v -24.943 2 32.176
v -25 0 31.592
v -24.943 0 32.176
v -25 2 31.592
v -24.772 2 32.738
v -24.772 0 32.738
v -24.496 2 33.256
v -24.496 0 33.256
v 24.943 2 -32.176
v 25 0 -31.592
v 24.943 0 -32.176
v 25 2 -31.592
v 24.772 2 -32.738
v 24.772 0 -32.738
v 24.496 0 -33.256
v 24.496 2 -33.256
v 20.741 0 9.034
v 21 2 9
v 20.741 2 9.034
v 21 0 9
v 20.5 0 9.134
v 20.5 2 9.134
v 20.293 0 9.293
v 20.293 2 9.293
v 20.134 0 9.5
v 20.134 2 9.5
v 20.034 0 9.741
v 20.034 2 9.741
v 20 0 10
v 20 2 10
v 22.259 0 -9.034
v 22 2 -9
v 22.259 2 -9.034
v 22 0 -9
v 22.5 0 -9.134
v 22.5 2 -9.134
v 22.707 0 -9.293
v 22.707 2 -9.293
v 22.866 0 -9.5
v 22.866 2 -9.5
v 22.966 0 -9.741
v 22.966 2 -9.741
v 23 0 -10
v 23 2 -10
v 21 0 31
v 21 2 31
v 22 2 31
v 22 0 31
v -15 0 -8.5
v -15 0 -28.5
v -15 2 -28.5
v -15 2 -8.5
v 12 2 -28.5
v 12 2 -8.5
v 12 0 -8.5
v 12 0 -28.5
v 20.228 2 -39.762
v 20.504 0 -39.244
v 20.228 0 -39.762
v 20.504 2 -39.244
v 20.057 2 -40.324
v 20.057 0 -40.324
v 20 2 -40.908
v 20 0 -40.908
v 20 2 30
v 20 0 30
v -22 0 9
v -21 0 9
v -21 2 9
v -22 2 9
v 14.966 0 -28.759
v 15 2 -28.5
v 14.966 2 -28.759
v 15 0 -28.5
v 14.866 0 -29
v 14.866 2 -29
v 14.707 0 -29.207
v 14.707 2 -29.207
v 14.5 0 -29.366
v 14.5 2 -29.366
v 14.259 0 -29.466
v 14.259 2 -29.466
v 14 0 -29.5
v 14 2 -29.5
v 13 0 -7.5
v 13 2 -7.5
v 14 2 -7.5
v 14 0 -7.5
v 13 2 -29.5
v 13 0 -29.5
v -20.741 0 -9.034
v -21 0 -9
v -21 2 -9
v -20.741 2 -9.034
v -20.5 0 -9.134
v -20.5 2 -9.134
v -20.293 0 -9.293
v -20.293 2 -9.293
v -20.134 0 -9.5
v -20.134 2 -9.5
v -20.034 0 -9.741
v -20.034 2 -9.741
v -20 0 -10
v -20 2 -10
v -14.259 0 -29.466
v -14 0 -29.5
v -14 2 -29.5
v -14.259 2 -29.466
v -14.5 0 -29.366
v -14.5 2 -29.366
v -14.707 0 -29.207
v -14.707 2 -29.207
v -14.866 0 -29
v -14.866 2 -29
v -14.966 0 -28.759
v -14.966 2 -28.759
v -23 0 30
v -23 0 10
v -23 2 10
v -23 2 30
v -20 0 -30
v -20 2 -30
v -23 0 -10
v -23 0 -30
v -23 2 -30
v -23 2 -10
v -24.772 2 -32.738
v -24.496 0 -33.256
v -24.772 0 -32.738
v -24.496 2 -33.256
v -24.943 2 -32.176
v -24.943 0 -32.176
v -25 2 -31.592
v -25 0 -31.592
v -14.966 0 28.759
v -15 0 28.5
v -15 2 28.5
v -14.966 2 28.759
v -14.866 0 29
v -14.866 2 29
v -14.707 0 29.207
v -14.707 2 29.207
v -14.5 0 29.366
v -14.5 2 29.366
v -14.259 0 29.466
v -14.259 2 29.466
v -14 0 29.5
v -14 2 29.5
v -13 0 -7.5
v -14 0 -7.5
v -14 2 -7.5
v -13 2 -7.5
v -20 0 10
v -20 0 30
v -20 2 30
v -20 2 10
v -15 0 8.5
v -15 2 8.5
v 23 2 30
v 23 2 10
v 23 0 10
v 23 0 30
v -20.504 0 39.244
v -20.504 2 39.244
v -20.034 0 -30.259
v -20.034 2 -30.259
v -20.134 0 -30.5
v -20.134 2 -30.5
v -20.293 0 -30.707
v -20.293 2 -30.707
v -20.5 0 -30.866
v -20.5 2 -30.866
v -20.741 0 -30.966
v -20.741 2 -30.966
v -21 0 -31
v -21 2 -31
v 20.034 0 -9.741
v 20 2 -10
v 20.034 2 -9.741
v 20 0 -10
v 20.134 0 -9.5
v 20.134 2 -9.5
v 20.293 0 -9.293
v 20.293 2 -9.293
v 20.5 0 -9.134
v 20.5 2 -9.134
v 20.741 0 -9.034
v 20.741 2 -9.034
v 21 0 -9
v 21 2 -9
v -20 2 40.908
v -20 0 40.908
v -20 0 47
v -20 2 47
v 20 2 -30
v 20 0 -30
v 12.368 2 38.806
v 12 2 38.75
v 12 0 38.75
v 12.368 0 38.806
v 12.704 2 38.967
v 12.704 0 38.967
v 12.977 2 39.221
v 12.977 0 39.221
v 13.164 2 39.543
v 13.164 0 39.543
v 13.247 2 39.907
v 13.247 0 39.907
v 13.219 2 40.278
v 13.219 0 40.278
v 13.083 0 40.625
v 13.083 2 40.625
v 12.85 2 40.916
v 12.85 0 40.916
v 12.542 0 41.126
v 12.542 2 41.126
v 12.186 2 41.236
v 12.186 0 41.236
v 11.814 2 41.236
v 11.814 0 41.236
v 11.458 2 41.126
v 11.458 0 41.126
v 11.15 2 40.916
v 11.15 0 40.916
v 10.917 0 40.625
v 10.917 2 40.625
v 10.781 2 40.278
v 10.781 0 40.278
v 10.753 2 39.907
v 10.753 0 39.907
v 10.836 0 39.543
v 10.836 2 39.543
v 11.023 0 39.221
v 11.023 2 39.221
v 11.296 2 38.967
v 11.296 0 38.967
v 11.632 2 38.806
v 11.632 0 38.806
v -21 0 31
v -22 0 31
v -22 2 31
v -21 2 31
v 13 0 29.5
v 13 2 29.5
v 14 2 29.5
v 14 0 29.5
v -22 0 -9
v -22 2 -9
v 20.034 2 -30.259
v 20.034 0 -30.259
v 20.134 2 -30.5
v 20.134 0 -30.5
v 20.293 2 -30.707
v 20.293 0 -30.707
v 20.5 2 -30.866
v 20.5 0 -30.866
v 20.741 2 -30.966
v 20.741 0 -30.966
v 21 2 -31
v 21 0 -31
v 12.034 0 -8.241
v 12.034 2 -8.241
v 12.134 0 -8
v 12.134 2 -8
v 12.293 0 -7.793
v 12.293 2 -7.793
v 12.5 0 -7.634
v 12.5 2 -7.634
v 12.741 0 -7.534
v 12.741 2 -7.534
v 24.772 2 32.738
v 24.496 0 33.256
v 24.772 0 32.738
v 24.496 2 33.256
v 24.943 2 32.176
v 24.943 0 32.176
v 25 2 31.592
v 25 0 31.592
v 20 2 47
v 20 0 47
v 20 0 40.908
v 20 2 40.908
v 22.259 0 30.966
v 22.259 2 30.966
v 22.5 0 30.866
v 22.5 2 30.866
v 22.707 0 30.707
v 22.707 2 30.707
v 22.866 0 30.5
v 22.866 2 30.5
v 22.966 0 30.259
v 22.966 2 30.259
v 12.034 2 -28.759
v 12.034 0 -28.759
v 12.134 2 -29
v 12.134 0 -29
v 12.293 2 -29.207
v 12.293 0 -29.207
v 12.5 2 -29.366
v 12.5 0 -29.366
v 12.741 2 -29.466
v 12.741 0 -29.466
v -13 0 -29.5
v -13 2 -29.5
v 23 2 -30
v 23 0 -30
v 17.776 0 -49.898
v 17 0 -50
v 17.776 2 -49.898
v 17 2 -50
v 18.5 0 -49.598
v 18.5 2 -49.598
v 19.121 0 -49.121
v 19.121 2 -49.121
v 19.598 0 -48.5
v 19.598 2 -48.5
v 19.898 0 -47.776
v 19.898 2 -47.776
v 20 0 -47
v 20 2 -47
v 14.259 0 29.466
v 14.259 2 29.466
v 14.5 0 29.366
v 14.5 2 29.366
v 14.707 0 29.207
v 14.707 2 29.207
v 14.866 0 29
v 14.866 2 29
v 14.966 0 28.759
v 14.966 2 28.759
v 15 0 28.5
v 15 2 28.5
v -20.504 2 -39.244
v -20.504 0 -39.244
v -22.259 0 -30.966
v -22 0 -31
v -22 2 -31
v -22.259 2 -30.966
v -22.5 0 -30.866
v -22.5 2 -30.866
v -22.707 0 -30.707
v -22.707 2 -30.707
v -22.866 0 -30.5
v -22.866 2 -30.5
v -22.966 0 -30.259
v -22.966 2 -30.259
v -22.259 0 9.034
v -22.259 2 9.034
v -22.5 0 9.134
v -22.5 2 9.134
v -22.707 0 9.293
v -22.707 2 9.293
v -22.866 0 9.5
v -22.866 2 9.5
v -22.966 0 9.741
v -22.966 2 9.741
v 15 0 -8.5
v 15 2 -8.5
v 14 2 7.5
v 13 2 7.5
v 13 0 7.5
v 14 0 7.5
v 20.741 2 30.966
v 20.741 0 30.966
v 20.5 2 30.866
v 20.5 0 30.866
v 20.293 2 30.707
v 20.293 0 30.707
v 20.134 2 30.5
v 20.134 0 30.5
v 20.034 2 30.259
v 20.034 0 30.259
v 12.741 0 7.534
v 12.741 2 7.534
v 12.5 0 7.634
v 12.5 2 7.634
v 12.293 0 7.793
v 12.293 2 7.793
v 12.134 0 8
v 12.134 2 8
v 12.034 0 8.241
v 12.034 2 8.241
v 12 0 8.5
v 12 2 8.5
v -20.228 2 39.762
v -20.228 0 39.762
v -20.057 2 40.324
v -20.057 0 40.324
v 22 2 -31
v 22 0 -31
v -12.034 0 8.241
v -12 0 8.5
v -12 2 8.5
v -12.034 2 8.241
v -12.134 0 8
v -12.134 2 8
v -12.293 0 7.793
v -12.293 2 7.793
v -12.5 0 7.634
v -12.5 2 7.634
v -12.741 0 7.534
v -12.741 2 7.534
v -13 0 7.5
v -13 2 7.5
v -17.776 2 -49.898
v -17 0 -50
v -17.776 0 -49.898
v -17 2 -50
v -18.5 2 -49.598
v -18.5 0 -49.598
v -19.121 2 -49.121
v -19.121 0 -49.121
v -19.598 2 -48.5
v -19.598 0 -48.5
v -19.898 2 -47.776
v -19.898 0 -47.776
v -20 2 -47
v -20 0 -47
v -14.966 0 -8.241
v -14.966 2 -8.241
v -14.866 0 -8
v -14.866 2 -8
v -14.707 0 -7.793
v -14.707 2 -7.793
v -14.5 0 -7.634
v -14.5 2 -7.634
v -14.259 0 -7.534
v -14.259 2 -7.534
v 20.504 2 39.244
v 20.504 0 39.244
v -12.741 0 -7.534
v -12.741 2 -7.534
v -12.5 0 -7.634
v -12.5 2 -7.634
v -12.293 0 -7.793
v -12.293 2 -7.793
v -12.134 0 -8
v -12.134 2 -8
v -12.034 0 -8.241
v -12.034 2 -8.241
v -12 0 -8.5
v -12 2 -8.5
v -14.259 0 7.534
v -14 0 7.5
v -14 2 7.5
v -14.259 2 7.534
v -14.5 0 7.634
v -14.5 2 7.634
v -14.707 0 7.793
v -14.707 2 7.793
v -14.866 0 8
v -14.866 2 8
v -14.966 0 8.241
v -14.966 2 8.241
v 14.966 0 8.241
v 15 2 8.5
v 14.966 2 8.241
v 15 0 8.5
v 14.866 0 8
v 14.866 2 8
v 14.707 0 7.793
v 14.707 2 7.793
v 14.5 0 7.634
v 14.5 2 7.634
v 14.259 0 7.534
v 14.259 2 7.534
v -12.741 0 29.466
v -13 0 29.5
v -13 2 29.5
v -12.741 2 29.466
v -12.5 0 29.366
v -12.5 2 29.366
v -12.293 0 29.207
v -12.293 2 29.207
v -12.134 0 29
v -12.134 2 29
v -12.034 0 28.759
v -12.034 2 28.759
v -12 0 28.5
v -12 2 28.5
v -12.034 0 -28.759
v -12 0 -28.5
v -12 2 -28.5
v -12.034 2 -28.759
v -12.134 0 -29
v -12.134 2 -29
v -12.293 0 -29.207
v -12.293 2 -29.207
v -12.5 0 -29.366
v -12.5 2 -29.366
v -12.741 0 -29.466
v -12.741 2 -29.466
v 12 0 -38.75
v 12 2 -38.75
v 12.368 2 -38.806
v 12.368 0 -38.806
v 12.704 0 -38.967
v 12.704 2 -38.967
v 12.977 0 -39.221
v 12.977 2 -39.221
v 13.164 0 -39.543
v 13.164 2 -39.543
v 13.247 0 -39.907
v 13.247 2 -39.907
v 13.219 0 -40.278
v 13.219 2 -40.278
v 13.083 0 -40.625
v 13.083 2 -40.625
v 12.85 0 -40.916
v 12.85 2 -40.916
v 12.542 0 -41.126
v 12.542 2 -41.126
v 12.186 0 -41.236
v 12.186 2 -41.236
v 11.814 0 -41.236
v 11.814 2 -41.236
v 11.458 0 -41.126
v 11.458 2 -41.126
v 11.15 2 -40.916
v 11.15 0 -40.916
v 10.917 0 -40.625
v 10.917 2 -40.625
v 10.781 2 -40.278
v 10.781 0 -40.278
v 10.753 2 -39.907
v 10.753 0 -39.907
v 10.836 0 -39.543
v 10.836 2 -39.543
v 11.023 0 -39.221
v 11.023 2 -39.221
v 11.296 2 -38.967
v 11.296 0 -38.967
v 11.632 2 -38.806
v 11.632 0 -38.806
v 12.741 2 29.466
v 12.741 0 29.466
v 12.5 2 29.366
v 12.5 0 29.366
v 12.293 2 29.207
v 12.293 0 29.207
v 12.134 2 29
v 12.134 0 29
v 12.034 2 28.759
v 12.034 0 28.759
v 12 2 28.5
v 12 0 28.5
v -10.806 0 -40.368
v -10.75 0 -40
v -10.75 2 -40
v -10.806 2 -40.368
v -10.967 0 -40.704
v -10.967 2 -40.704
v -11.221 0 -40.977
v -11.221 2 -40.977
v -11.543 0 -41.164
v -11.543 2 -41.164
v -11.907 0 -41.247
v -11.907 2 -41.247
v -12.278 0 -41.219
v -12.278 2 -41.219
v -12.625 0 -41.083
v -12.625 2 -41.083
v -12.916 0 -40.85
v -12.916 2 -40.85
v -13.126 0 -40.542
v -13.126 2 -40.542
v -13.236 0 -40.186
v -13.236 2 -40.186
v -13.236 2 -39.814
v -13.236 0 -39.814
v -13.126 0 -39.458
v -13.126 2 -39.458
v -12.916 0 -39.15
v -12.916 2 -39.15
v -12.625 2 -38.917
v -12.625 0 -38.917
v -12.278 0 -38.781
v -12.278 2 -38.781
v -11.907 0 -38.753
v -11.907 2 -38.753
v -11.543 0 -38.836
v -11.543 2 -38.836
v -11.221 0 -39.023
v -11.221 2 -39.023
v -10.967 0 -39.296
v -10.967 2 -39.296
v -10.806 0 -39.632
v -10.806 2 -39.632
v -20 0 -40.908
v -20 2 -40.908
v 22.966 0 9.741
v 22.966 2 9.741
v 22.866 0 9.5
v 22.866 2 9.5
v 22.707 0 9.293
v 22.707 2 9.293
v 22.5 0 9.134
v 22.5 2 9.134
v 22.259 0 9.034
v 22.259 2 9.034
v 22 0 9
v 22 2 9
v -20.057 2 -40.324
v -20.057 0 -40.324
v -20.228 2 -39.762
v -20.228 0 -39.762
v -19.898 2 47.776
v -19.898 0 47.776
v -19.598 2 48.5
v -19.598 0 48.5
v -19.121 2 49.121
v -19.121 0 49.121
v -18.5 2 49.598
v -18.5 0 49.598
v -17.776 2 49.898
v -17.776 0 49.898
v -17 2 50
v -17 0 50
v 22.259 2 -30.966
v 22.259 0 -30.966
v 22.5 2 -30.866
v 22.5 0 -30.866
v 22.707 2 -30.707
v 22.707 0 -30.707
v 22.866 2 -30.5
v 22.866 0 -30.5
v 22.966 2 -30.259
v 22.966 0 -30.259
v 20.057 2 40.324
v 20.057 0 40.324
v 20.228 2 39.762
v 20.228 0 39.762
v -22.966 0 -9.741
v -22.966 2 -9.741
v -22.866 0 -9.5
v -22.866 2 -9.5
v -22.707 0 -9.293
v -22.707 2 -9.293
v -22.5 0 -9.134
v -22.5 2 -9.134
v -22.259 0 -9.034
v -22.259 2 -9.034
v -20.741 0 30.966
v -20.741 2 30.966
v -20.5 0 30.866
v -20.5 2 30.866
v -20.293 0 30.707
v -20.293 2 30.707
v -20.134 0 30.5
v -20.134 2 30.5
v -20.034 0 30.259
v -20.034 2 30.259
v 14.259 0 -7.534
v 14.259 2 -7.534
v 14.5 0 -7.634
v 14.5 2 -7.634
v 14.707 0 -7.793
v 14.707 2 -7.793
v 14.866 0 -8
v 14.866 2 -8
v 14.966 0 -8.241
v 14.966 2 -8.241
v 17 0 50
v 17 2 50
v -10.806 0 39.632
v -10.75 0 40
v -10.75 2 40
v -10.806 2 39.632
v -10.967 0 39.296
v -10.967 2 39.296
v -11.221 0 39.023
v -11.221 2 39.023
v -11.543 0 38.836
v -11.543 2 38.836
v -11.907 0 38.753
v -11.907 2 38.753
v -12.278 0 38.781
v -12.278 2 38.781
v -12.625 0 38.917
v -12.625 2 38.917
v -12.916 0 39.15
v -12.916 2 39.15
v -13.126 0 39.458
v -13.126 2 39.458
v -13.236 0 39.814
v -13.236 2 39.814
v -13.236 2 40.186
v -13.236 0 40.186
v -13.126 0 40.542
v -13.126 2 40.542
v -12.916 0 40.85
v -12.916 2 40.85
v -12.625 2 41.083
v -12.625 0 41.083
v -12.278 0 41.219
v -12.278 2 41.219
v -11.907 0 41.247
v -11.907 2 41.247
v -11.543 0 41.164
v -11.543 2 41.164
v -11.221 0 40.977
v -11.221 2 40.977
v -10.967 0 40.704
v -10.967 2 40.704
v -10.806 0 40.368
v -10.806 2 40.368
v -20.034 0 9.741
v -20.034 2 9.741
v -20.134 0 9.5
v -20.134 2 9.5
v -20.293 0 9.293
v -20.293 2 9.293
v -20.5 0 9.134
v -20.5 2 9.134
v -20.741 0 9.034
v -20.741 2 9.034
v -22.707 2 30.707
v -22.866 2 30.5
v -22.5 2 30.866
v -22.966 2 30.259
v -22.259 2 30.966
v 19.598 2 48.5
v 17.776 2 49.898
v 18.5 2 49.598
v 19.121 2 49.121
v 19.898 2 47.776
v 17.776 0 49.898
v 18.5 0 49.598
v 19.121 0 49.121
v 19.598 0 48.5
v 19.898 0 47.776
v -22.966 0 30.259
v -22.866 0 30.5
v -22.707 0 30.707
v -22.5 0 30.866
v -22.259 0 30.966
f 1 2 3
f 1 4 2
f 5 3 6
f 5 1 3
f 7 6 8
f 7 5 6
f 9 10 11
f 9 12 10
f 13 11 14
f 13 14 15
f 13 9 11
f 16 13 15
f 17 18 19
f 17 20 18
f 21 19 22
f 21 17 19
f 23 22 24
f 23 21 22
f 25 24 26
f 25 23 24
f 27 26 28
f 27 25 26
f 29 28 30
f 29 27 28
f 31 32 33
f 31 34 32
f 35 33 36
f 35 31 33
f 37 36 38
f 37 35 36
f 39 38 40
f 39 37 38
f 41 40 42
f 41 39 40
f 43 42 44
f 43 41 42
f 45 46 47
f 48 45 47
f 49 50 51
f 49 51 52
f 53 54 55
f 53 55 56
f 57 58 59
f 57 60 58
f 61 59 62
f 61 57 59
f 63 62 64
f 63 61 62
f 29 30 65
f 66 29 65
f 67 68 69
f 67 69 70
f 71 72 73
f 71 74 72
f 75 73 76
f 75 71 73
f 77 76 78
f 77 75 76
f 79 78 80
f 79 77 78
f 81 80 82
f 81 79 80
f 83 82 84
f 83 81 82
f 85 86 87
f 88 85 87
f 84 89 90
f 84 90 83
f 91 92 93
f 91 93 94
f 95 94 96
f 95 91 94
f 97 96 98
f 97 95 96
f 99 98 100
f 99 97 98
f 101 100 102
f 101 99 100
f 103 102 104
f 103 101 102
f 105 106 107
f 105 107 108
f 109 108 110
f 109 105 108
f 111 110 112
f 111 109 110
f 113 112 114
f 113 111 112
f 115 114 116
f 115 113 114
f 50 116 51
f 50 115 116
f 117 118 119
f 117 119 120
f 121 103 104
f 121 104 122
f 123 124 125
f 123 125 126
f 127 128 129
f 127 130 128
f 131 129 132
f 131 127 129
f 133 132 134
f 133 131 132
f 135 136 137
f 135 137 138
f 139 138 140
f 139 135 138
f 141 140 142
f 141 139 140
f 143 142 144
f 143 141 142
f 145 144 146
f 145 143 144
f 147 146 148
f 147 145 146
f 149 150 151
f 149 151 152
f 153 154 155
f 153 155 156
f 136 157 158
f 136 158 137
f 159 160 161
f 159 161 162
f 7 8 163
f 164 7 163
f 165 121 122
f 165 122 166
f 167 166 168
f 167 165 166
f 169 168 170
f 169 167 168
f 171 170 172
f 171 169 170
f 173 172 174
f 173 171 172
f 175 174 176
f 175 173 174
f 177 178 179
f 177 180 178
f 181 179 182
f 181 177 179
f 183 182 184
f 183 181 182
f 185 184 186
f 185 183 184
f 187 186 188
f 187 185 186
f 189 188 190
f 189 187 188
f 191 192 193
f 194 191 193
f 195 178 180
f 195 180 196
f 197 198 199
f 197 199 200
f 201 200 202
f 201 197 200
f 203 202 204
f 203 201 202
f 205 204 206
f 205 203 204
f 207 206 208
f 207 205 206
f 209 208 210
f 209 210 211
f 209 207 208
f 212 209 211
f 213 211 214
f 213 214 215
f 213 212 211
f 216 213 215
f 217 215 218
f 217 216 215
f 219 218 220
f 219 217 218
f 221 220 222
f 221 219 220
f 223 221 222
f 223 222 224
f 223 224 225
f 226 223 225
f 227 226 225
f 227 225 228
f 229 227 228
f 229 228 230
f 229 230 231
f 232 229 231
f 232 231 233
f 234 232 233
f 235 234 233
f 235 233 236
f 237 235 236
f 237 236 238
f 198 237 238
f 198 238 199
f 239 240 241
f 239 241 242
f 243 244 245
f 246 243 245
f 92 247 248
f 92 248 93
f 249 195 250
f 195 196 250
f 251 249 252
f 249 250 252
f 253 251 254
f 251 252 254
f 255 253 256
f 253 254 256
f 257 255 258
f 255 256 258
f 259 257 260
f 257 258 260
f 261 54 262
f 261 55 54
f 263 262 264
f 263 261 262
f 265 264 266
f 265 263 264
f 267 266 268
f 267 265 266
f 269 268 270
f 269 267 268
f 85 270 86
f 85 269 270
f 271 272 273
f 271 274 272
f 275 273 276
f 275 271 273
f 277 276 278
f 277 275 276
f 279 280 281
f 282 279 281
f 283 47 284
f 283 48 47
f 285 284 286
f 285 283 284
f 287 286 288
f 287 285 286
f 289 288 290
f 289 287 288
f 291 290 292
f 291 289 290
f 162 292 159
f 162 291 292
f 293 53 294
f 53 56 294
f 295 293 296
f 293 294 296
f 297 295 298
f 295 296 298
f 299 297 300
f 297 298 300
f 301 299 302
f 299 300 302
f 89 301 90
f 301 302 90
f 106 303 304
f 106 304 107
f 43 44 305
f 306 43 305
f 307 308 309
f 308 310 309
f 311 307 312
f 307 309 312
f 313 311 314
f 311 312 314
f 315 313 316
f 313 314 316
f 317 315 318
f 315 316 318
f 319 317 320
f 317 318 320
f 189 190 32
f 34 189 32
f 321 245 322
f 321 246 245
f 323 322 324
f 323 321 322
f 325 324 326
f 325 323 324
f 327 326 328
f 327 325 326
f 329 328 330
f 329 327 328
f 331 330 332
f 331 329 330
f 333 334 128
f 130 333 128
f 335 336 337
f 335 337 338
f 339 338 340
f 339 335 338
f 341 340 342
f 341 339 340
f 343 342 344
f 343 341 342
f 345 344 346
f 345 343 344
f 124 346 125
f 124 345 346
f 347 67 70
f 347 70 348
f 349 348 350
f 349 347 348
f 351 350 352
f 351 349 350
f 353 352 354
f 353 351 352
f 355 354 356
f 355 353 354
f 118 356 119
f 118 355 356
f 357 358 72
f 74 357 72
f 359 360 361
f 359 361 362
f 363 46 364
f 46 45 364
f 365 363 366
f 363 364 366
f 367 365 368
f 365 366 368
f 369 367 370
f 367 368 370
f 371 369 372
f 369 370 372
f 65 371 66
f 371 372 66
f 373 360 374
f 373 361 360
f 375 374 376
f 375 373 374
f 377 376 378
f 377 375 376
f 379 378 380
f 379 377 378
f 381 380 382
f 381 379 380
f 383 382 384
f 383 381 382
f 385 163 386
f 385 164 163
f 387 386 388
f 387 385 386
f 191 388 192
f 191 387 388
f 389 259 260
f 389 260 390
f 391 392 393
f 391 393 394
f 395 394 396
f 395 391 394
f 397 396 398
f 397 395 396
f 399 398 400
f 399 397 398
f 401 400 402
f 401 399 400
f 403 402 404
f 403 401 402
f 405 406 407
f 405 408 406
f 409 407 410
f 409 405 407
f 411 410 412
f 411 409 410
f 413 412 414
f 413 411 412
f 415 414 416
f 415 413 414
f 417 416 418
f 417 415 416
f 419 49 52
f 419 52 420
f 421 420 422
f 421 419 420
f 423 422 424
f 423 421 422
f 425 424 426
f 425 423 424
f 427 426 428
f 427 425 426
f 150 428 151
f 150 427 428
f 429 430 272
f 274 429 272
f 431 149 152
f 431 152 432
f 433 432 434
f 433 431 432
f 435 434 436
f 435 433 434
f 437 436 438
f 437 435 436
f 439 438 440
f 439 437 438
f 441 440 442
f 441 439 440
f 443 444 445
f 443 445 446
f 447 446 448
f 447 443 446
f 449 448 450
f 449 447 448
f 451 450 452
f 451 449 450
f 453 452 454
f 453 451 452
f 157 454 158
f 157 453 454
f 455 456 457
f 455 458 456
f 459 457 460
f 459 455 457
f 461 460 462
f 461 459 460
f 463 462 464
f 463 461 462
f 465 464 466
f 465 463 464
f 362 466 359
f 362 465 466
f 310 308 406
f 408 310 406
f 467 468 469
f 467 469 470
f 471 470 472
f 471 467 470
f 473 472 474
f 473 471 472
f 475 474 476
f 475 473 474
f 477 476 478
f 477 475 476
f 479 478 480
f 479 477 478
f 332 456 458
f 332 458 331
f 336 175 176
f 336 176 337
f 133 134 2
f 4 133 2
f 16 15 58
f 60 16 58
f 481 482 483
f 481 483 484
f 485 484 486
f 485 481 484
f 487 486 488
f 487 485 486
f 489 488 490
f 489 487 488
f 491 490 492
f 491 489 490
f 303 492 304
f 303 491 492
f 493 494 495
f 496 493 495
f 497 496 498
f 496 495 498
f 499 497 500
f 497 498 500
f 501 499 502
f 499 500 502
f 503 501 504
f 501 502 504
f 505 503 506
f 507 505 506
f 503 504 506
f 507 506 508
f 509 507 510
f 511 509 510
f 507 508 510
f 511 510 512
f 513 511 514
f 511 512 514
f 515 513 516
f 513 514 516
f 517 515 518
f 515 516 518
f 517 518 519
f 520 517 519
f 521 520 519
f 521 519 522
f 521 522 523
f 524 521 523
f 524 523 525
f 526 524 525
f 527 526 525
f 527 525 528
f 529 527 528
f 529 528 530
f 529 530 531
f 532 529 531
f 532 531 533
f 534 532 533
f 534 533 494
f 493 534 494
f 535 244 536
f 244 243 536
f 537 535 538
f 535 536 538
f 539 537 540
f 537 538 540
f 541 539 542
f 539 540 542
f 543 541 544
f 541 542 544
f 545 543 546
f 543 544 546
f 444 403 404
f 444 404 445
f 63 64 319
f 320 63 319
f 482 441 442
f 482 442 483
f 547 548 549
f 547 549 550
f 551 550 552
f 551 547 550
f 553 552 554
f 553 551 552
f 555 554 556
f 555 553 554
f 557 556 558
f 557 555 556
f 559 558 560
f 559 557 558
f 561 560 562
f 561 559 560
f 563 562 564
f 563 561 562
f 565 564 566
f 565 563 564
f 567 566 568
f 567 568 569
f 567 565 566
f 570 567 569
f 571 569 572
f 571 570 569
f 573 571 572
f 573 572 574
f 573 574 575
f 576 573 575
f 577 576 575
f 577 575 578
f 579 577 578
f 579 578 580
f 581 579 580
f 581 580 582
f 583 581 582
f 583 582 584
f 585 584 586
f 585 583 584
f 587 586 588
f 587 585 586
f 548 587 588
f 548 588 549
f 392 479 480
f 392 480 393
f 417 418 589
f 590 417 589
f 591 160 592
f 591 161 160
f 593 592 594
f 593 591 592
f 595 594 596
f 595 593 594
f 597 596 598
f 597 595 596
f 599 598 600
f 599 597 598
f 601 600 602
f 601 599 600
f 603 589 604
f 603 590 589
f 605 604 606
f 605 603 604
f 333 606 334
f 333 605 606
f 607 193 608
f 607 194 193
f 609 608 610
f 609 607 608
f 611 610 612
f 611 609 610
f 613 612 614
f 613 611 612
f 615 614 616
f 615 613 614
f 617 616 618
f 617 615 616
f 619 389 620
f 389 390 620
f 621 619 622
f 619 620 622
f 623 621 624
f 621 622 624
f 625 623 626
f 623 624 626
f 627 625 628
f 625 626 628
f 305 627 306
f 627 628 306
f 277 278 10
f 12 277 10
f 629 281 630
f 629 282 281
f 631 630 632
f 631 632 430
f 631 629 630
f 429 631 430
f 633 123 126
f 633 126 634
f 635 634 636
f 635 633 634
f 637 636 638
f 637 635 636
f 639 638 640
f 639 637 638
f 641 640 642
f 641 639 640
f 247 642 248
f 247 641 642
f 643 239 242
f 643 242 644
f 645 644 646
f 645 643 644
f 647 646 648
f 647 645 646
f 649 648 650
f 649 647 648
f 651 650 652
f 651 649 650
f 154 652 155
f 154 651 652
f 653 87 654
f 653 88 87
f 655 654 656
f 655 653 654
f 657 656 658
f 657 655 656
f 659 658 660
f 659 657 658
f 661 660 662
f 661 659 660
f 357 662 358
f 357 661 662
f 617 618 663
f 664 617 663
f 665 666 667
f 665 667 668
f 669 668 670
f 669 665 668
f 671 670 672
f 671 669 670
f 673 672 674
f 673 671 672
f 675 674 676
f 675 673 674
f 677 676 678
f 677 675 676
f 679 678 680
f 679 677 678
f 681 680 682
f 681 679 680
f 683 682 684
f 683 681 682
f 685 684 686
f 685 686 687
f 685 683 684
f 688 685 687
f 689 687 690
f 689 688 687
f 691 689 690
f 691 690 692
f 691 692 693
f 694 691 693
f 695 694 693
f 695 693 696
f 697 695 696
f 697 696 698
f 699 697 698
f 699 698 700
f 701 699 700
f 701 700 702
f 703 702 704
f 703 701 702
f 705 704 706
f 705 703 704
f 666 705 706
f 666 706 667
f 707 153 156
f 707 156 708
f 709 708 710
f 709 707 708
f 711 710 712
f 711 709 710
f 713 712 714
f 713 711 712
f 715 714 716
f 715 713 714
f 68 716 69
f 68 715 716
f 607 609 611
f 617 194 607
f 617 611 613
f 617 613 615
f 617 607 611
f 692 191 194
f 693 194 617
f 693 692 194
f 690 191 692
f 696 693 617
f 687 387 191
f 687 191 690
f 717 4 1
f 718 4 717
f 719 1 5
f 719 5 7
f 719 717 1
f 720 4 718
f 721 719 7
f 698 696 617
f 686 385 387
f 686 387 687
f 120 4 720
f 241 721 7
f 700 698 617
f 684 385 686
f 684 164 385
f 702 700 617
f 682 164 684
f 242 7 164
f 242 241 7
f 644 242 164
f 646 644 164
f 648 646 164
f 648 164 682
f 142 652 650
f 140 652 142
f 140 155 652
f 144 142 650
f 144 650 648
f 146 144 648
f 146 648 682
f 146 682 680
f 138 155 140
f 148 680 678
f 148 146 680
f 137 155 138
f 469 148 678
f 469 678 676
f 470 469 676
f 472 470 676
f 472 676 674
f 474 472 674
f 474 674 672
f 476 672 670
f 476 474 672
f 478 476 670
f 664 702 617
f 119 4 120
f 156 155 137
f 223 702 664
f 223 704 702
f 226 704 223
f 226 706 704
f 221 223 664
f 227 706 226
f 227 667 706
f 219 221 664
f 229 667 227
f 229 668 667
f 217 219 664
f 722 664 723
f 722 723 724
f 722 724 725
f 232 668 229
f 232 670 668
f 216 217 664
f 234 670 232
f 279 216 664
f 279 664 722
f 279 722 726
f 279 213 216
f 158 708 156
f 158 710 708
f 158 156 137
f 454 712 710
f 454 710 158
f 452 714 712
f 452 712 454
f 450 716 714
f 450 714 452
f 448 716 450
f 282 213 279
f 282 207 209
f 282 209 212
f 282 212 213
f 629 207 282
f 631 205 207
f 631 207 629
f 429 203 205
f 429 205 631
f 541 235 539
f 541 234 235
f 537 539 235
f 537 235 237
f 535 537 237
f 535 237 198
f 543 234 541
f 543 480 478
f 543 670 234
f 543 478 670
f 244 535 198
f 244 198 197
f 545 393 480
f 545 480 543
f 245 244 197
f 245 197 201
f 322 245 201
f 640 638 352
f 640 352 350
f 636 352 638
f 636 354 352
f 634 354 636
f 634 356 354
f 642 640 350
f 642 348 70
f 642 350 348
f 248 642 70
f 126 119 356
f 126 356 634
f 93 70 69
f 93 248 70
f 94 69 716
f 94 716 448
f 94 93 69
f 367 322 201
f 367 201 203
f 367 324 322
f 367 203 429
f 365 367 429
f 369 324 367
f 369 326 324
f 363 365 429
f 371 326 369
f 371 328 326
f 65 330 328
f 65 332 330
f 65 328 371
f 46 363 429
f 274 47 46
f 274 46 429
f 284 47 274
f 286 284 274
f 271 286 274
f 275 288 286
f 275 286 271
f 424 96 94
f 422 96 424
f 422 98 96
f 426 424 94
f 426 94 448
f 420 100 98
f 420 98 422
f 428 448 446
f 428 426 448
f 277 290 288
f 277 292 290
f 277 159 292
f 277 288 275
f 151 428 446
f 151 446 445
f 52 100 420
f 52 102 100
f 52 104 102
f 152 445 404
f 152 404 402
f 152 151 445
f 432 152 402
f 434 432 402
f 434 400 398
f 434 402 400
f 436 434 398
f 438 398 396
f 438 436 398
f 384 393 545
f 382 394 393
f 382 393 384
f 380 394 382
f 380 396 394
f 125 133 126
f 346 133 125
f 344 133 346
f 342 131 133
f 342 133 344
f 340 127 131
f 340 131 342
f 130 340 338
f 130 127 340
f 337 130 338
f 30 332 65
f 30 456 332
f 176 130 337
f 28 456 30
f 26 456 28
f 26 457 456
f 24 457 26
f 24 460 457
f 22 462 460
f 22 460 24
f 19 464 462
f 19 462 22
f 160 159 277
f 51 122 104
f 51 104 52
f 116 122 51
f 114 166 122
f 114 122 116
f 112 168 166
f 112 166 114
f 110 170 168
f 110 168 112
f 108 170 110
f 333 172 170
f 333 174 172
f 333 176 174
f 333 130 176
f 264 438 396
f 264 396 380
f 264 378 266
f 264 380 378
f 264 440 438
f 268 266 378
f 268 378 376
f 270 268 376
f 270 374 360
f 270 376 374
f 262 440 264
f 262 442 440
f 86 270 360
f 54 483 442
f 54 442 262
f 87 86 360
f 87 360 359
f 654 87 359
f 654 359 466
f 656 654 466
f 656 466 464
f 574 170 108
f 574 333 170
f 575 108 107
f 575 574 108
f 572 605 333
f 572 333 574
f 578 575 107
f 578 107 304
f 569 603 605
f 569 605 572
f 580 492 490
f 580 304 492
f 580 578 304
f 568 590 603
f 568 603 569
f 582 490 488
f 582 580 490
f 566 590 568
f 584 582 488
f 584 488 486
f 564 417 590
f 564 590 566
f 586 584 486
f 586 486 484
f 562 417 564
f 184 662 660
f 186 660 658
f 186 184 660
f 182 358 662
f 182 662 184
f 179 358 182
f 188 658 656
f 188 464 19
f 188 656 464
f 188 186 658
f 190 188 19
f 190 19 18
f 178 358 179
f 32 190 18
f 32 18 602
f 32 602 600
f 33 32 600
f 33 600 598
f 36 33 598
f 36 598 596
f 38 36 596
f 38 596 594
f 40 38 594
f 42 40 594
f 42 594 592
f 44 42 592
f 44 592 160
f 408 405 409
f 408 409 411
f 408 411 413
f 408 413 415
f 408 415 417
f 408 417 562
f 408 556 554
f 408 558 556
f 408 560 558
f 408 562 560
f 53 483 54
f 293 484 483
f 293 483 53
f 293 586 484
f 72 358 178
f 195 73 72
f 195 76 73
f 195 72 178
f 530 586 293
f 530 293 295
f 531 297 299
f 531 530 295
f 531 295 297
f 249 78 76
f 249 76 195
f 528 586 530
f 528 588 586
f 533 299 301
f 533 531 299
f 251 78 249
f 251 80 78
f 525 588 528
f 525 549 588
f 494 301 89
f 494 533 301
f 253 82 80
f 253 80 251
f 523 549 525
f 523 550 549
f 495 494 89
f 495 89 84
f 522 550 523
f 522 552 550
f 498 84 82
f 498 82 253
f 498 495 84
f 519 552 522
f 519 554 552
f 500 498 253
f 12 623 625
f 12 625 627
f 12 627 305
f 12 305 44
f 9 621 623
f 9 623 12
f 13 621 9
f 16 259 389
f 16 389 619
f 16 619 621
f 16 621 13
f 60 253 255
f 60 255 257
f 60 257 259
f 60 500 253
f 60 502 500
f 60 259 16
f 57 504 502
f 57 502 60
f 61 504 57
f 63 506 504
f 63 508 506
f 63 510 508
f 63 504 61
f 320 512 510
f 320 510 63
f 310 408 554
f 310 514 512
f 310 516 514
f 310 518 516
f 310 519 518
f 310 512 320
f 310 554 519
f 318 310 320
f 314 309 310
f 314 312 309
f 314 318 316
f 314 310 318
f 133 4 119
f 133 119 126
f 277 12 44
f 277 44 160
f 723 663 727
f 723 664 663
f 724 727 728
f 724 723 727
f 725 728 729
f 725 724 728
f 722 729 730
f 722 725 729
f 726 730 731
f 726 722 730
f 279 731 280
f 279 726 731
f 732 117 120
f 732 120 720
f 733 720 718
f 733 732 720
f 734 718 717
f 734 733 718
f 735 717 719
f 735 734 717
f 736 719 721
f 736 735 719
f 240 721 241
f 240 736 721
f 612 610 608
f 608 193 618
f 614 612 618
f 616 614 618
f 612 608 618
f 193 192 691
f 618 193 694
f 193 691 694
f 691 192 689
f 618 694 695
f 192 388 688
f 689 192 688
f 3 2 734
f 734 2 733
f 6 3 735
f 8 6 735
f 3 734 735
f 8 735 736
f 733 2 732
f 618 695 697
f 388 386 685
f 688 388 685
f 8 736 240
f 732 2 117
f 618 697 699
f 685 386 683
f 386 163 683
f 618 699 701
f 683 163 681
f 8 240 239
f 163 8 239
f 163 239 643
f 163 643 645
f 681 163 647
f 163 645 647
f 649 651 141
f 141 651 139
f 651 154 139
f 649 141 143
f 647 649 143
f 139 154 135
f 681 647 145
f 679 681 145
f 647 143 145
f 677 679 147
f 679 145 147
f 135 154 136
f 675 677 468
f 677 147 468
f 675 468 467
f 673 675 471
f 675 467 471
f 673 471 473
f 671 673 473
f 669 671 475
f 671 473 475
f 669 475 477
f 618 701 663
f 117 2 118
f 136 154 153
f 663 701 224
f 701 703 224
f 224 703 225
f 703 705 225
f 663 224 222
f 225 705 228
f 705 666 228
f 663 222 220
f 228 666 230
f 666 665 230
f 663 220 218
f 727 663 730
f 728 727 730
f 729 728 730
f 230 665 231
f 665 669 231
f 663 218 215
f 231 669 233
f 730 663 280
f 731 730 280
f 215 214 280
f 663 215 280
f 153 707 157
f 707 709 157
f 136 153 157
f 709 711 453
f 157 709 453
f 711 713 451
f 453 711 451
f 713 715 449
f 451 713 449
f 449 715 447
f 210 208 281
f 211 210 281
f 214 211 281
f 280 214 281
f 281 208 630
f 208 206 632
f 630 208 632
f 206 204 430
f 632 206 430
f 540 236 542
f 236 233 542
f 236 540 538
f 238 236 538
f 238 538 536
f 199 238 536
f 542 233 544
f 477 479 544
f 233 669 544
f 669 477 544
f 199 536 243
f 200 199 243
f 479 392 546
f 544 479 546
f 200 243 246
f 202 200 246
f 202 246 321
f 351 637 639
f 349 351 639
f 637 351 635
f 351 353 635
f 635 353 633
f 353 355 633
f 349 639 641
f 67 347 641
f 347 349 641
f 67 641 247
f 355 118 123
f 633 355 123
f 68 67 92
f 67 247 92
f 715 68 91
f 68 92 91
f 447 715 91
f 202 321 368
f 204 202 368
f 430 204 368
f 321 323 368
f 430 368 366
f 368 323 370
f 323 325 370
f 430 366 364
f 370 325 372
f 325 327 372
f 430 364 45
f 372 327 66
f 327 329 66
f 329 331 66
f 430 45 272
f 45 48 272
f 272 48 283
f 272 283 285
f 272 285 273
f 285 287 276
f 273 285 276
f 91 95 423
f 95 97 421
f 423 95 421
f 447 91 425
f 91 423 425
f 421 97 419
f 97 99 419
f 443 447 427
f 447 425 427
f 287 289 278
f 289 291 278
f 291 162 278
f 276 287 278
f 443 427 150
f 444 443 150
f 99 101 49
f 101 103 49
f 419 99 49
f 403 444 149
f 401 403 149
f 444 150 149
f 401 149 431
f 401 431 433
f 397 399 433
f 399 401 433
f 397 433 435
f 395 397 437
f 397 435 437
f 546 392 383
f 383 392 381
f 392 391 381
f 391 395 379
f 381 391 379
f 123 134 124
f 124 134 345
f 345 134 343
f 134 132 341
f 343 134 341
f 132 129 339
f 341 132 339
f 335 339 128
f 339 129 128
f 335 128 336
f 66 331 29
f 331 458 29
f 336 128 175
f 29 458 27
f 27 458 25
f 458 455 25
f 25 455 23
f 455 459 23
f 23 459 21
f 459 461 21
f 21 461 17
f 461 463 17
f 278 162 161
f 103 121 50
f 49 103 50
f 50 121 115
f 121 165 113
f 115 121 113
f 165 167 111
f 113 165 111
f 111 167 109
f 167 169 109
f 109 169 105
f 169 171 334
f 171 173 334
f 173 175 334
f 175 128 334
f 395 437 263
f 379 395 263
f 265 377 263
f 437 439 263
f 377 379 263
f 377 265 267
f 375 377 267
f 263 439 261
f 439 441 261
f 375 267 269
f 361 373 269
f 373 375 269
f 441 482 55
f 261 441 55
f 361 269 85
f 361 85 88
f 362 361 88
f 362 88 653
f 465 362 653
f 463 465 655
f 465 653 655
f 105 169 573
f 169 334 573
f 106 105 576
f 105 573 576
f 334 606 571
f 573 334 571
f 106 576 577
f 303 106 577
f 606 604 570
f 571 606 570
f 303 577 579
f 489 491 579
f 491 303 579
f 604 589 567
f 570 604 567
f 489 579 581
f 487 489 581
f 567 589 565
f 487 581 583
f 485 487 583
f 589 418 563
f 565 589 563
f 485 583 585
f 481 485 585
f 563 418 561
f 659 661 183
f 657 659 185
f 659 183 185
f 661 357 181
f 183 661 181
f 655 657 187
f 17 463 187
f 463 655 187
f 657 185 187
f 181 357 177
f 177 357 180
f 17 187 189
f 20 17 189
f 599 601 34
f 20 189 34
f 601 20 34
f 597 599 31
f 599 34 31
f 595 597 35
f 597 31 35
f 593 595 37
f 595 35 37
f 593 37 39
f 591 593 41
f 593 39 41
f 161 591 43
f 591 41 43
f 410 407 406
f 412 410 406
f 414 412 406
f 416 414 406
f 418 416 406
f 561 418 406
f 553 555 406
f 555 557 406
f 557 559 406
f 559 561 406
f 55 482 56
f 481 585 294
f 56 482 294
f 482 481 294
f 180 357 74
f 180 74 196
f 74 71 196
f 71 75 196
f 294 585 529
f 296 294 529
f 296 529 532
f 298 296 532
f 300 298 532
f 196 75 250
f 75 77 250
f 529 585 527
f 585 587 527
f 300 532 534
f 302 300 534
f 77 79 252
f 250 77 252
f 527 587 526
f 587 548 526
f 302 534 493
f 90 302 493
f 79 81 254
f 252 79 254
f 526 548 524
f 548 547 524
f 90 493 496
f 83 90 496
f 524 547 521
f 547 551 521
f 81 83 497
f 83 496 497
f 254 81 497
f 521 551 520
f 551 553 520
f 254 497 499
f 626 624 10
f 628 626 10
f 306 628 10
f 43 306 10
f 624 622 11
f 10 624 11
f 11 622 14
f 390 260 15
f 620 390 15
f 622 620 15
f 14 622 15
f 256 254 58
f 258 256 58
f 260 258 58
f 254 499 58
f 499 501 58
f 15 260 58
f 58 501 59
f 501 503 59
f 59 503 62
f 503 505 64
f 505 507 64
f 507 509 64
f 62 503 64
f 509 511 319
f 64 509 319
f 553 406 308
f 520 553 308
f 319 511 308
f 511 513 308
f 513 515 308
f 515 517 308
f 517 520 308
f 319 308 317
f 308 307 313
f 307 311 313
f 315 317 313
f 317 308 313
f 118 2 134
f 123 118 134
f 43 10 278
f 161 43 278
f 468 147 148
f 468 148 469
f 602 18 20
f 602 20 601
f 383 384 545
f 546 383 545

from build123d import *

# Parameters (mm, degrees)
BOSS_EXTRUDE1_DEPTH  = 2
FILLET1_R            = 3
CUT_EXTRUDE1_REACH   = 57.937
SKETCH2_R            = 1.25
SKETCH2_W            = 3
SKETCH2_H            = 22
FILLET2_R            = 1
FILLET2_OF_MIRROR1_R = 1
MIRROR2_OUTLINE_R    = 1.25
MIRROR2_DEPTH        = 2


# Read off the part's stored shape, not the designer's step: Mirror2
with BuildPart() as part:
    # Sketch1 → Boss-Extrude1 (new body)
    with BuildSketch(Plane(origin=(0, 0, 0), x_dir=(1, 0, 0), z_dir=(0, 1, 0))):
        Polygon((20, 50), (-20, 50), (-20, 40), (-25, 32.5), (-25, -32.5), (-20, -40), (-20, -50), (20, -50), (20, -40), (25, -32.5), (25, 32.5), (20, 40), align=None)
    extrude(amount=BOSS_EXTRUDE1_DEPTH)

    # Fillet1
    fillet1_edges = [part.edges().sort_by_distance(p)[0] for p in [
        (-20, 1, -50),
        (20, 1, -50),
        (20, 1, -40),
        (25, 1, -32.5),
        (25, 1, 32.5),
        (20, 1, 40),
        (20, 1, 50),
        (-20, 1, 50),
        (-20, 1, 40),
        (-25, 1, 32.5),
        (-25, 1, -32.5),
        (-20, 1, -40),
    ]]
    fillet(fillet1_edges, radius=FILLET1_R)

    # Sketch2 → Cut-Extrude1 (cut, up to next)
    with BuildSketch(Plane(origin=(0, 2, 0), x_dir=(1, 0, 0), z_dir=(0, 1, 0)), mode=Mode.PRIVATE) as cut_extrude1_sk1:
        with Locations(Location((12, 40, 0), (0, 0, 270))):
            Circle(SKETCH2_R)
    cut_extrude1_tool1 = extrude(cut_extrude1_sk1.sketch, amount=-CUT_EXTRUDE1_REACH, mode=Mode.PRIVATE) & part.part
    # Sketch2 → Cut-Extrude1 (cut, up to next)
    with BuildSketch(Plane(origin=(0, 2, 0), x_dir=(1, 0, 0), z_dir=(0, 1, 0)), mode=Mode.PRIVATE) as cut_extrude1_sk2:
        with Locations((21.5, 20)):
            Rectangle(SKETCH2_W, SKETCH2_H)
    cut_extrude1_tool2 = extrude(cut_extrude1_sk2.sketch, amount=-CUT_EXTRUDE1_REACH, mode=Mode.PRIVATE) & part.part
    # Sketch2 → Cut-Extrude1 (cut, up to next)
    with BuildSketch(Plane(origin=(0, 2, 0), x_dir=(1, 0, 0), z_dir=(0, 1, 0)), mode=Mode.PRIVATE) as cut_extrude1_sk3:
        with Locations((13.5, 18.5)):
            Rectangle(SKETCH2_W, SKETCH2_H)
    cut_extrude1_tool3 = extrude(cut_extrude1_sk3.sketch, amount=-CUT_EXTRUDE1_REACH, mode=Mode.PRIVATE) & part.part
    cut_extrude1_1 = cut_extrude1_tool1.solids().sort_by_distance((12, 2, -40))[0]
    add(cut_extrude1_1, mode=Mode.SUBTRACT)
    cut_extrude1_2 = cut_extrude1_tool2.solids().sort_by_distance((21.5, 2, -20))[0]
    add(cut_extrude1_2, mode=Mode.SUBTRACT)
    cut_extrude1_3 = cut_extrude1_tool3.solids().sort_by_distance((13.5, 2, -18.5))[0]
    add(cut_extrude1_3, mode=Mode.SUBTRACT)
    cut_extrude1 = cut_extrude1_1 + cut_extrude1_2 + cut_extrude1_3  # Cut-Extrude1 as one shape, for the pattern or mirror that repeats it

    # Fillet2
    fillet2_edges = [part.edges().sort_by_distance(p)[0] for p in [
        (20, 1, -9),
        (20, 1, -31),
        (23, 1, -31),
        (23, 1, -9),
        (15, 1, -29.5),
        (15, 1, -7.5),
        (12, 1, -7.5),
        (12, 1, -29.5),
    ]]
    fillet(fillet2_edges, radius=FILLET2_R)

    # Mirror1: Cut-Extrude1 across plane
    add(cut_extrude1.mirror(Plane.XY), mode=Mode.SUBTRACT)

    # Fillet2 of Mirror1
    fillet2_of_mirror1_edges = [part.edges().sort_by_distance(p)[0] for p in [
        (20, 1, 9),
        (20, 1, 31),
        (23, 1, 31),
        (23, 1, 9),
        (15, 1, 29.5),
        (15, 1, 7.5),
        (12, 1, 7.5),
        (12, 1, 29.5),
    ]]
    fillet(fillet2_of_mirror1_edges, radius=FILLET2_OF_MIRROR1_R)

    # Mirror2 outline → Mirror2 (cut)
    with BuildSketch(Plane(origin=(0, 0, 0), x_dir=(1, 0, 0), z_dir=(0, 1, 0))):
        with BuildLine():
            Line((-20, 10), (-20, 30))
            ThreePointArc((-20, 30), (-20.292893219, 30.707106781), (-21, 31))
            Line((-21, 31), (-22, 31))
            ThreePointArc((-22, 31), (-22.707106781, 30.707106781), (-23, 30))
            Line((-23, 30), (-23, 10))
            ThreePointArc((-23, 10), (-22.707106781, 9.292893219), (-22, 9))
            Line((-22, 9), (-21, 9))
            ThreePointArc((-21, 9), (-20.292893219, 9.292893219), (-20, 10))
        make_face()
        with BuildLine():
            ThreePointArc((-21, -31), (-20.292893219, -30.707106781), (-20, -30))
            Line((-20, -30), (-20, -10))
            ThreePointArc((-20, -10), (-20.292893219, -9.292893219), (-21, -9))
            Line((-21, -9), (-22, -9))
            ThreePointArc((-22, -9), (-22.707106781, -9.292893219), (-23, -10))
            Line((-23, -10), (-23, -30))
            ThreePointArc((-23, -30), (-22.707106781, -30.707106781), (-22, -31))
            Line((-22, -31), (-21, -31))
        make_face()
        with BuildLine():
            Line((-14, 7.5), (-13, 7.5))
            ThreePointArc((-13, 7.5), (-12.292893219, 7.792893219), (-12, 8.5))
            Line((-12, 8.5), (-12, 28.5))
            ThreePointArc((-12, 28.5), (-12.292893219, 29.207106781), (-13, 29.5))
            Line((-13, 29.5), (-14, 29.5))
            ThreePointArc((-14, 29.5), (-14.707106781, 29.207106781), (-15, 28.5))
            Line((-15, 28.5), (-15, 8.5))
            ThreePointArc((-15, 8.5), (-14.707106781, 7.792893219), (-14, 7.5))
        make_face()
        with BuildLine():
            ThreePointArc((-15, -28.5), (-14.707106781, -29.207106781), (-14, -29.5))
            Line((-14, -29.5), (-13, -29.5))
            ThreePointArc((-13, -29.5), (-12.292893219, -29.207106781), (-12, -28.5))
            Line((-12, -28.5), (-12, -8.5))
            ThreePointArc((-12, -8.5), (-12.292893219, -7.792893219), (-13, -7.5))
            Line((-13, -7.5), (-14, -7.5))
            ThreePointArc((-14, -7.5), (-14.707106781, -7.792893219), (-15, -8.5))
            Line((-15, -8.5), (-15, -28.5))
        make_face()
        with Locations((-12, 40)):
            Circle(MIRROR2_OUTLINE_R)
        with Locations((-12, -40)):
            Circle(MIRROR2_OUTLINE_R)
    extrude(amount=MIRROR2_DEPTH, mode=Mode.SUBTRACT)


solid = part.part
